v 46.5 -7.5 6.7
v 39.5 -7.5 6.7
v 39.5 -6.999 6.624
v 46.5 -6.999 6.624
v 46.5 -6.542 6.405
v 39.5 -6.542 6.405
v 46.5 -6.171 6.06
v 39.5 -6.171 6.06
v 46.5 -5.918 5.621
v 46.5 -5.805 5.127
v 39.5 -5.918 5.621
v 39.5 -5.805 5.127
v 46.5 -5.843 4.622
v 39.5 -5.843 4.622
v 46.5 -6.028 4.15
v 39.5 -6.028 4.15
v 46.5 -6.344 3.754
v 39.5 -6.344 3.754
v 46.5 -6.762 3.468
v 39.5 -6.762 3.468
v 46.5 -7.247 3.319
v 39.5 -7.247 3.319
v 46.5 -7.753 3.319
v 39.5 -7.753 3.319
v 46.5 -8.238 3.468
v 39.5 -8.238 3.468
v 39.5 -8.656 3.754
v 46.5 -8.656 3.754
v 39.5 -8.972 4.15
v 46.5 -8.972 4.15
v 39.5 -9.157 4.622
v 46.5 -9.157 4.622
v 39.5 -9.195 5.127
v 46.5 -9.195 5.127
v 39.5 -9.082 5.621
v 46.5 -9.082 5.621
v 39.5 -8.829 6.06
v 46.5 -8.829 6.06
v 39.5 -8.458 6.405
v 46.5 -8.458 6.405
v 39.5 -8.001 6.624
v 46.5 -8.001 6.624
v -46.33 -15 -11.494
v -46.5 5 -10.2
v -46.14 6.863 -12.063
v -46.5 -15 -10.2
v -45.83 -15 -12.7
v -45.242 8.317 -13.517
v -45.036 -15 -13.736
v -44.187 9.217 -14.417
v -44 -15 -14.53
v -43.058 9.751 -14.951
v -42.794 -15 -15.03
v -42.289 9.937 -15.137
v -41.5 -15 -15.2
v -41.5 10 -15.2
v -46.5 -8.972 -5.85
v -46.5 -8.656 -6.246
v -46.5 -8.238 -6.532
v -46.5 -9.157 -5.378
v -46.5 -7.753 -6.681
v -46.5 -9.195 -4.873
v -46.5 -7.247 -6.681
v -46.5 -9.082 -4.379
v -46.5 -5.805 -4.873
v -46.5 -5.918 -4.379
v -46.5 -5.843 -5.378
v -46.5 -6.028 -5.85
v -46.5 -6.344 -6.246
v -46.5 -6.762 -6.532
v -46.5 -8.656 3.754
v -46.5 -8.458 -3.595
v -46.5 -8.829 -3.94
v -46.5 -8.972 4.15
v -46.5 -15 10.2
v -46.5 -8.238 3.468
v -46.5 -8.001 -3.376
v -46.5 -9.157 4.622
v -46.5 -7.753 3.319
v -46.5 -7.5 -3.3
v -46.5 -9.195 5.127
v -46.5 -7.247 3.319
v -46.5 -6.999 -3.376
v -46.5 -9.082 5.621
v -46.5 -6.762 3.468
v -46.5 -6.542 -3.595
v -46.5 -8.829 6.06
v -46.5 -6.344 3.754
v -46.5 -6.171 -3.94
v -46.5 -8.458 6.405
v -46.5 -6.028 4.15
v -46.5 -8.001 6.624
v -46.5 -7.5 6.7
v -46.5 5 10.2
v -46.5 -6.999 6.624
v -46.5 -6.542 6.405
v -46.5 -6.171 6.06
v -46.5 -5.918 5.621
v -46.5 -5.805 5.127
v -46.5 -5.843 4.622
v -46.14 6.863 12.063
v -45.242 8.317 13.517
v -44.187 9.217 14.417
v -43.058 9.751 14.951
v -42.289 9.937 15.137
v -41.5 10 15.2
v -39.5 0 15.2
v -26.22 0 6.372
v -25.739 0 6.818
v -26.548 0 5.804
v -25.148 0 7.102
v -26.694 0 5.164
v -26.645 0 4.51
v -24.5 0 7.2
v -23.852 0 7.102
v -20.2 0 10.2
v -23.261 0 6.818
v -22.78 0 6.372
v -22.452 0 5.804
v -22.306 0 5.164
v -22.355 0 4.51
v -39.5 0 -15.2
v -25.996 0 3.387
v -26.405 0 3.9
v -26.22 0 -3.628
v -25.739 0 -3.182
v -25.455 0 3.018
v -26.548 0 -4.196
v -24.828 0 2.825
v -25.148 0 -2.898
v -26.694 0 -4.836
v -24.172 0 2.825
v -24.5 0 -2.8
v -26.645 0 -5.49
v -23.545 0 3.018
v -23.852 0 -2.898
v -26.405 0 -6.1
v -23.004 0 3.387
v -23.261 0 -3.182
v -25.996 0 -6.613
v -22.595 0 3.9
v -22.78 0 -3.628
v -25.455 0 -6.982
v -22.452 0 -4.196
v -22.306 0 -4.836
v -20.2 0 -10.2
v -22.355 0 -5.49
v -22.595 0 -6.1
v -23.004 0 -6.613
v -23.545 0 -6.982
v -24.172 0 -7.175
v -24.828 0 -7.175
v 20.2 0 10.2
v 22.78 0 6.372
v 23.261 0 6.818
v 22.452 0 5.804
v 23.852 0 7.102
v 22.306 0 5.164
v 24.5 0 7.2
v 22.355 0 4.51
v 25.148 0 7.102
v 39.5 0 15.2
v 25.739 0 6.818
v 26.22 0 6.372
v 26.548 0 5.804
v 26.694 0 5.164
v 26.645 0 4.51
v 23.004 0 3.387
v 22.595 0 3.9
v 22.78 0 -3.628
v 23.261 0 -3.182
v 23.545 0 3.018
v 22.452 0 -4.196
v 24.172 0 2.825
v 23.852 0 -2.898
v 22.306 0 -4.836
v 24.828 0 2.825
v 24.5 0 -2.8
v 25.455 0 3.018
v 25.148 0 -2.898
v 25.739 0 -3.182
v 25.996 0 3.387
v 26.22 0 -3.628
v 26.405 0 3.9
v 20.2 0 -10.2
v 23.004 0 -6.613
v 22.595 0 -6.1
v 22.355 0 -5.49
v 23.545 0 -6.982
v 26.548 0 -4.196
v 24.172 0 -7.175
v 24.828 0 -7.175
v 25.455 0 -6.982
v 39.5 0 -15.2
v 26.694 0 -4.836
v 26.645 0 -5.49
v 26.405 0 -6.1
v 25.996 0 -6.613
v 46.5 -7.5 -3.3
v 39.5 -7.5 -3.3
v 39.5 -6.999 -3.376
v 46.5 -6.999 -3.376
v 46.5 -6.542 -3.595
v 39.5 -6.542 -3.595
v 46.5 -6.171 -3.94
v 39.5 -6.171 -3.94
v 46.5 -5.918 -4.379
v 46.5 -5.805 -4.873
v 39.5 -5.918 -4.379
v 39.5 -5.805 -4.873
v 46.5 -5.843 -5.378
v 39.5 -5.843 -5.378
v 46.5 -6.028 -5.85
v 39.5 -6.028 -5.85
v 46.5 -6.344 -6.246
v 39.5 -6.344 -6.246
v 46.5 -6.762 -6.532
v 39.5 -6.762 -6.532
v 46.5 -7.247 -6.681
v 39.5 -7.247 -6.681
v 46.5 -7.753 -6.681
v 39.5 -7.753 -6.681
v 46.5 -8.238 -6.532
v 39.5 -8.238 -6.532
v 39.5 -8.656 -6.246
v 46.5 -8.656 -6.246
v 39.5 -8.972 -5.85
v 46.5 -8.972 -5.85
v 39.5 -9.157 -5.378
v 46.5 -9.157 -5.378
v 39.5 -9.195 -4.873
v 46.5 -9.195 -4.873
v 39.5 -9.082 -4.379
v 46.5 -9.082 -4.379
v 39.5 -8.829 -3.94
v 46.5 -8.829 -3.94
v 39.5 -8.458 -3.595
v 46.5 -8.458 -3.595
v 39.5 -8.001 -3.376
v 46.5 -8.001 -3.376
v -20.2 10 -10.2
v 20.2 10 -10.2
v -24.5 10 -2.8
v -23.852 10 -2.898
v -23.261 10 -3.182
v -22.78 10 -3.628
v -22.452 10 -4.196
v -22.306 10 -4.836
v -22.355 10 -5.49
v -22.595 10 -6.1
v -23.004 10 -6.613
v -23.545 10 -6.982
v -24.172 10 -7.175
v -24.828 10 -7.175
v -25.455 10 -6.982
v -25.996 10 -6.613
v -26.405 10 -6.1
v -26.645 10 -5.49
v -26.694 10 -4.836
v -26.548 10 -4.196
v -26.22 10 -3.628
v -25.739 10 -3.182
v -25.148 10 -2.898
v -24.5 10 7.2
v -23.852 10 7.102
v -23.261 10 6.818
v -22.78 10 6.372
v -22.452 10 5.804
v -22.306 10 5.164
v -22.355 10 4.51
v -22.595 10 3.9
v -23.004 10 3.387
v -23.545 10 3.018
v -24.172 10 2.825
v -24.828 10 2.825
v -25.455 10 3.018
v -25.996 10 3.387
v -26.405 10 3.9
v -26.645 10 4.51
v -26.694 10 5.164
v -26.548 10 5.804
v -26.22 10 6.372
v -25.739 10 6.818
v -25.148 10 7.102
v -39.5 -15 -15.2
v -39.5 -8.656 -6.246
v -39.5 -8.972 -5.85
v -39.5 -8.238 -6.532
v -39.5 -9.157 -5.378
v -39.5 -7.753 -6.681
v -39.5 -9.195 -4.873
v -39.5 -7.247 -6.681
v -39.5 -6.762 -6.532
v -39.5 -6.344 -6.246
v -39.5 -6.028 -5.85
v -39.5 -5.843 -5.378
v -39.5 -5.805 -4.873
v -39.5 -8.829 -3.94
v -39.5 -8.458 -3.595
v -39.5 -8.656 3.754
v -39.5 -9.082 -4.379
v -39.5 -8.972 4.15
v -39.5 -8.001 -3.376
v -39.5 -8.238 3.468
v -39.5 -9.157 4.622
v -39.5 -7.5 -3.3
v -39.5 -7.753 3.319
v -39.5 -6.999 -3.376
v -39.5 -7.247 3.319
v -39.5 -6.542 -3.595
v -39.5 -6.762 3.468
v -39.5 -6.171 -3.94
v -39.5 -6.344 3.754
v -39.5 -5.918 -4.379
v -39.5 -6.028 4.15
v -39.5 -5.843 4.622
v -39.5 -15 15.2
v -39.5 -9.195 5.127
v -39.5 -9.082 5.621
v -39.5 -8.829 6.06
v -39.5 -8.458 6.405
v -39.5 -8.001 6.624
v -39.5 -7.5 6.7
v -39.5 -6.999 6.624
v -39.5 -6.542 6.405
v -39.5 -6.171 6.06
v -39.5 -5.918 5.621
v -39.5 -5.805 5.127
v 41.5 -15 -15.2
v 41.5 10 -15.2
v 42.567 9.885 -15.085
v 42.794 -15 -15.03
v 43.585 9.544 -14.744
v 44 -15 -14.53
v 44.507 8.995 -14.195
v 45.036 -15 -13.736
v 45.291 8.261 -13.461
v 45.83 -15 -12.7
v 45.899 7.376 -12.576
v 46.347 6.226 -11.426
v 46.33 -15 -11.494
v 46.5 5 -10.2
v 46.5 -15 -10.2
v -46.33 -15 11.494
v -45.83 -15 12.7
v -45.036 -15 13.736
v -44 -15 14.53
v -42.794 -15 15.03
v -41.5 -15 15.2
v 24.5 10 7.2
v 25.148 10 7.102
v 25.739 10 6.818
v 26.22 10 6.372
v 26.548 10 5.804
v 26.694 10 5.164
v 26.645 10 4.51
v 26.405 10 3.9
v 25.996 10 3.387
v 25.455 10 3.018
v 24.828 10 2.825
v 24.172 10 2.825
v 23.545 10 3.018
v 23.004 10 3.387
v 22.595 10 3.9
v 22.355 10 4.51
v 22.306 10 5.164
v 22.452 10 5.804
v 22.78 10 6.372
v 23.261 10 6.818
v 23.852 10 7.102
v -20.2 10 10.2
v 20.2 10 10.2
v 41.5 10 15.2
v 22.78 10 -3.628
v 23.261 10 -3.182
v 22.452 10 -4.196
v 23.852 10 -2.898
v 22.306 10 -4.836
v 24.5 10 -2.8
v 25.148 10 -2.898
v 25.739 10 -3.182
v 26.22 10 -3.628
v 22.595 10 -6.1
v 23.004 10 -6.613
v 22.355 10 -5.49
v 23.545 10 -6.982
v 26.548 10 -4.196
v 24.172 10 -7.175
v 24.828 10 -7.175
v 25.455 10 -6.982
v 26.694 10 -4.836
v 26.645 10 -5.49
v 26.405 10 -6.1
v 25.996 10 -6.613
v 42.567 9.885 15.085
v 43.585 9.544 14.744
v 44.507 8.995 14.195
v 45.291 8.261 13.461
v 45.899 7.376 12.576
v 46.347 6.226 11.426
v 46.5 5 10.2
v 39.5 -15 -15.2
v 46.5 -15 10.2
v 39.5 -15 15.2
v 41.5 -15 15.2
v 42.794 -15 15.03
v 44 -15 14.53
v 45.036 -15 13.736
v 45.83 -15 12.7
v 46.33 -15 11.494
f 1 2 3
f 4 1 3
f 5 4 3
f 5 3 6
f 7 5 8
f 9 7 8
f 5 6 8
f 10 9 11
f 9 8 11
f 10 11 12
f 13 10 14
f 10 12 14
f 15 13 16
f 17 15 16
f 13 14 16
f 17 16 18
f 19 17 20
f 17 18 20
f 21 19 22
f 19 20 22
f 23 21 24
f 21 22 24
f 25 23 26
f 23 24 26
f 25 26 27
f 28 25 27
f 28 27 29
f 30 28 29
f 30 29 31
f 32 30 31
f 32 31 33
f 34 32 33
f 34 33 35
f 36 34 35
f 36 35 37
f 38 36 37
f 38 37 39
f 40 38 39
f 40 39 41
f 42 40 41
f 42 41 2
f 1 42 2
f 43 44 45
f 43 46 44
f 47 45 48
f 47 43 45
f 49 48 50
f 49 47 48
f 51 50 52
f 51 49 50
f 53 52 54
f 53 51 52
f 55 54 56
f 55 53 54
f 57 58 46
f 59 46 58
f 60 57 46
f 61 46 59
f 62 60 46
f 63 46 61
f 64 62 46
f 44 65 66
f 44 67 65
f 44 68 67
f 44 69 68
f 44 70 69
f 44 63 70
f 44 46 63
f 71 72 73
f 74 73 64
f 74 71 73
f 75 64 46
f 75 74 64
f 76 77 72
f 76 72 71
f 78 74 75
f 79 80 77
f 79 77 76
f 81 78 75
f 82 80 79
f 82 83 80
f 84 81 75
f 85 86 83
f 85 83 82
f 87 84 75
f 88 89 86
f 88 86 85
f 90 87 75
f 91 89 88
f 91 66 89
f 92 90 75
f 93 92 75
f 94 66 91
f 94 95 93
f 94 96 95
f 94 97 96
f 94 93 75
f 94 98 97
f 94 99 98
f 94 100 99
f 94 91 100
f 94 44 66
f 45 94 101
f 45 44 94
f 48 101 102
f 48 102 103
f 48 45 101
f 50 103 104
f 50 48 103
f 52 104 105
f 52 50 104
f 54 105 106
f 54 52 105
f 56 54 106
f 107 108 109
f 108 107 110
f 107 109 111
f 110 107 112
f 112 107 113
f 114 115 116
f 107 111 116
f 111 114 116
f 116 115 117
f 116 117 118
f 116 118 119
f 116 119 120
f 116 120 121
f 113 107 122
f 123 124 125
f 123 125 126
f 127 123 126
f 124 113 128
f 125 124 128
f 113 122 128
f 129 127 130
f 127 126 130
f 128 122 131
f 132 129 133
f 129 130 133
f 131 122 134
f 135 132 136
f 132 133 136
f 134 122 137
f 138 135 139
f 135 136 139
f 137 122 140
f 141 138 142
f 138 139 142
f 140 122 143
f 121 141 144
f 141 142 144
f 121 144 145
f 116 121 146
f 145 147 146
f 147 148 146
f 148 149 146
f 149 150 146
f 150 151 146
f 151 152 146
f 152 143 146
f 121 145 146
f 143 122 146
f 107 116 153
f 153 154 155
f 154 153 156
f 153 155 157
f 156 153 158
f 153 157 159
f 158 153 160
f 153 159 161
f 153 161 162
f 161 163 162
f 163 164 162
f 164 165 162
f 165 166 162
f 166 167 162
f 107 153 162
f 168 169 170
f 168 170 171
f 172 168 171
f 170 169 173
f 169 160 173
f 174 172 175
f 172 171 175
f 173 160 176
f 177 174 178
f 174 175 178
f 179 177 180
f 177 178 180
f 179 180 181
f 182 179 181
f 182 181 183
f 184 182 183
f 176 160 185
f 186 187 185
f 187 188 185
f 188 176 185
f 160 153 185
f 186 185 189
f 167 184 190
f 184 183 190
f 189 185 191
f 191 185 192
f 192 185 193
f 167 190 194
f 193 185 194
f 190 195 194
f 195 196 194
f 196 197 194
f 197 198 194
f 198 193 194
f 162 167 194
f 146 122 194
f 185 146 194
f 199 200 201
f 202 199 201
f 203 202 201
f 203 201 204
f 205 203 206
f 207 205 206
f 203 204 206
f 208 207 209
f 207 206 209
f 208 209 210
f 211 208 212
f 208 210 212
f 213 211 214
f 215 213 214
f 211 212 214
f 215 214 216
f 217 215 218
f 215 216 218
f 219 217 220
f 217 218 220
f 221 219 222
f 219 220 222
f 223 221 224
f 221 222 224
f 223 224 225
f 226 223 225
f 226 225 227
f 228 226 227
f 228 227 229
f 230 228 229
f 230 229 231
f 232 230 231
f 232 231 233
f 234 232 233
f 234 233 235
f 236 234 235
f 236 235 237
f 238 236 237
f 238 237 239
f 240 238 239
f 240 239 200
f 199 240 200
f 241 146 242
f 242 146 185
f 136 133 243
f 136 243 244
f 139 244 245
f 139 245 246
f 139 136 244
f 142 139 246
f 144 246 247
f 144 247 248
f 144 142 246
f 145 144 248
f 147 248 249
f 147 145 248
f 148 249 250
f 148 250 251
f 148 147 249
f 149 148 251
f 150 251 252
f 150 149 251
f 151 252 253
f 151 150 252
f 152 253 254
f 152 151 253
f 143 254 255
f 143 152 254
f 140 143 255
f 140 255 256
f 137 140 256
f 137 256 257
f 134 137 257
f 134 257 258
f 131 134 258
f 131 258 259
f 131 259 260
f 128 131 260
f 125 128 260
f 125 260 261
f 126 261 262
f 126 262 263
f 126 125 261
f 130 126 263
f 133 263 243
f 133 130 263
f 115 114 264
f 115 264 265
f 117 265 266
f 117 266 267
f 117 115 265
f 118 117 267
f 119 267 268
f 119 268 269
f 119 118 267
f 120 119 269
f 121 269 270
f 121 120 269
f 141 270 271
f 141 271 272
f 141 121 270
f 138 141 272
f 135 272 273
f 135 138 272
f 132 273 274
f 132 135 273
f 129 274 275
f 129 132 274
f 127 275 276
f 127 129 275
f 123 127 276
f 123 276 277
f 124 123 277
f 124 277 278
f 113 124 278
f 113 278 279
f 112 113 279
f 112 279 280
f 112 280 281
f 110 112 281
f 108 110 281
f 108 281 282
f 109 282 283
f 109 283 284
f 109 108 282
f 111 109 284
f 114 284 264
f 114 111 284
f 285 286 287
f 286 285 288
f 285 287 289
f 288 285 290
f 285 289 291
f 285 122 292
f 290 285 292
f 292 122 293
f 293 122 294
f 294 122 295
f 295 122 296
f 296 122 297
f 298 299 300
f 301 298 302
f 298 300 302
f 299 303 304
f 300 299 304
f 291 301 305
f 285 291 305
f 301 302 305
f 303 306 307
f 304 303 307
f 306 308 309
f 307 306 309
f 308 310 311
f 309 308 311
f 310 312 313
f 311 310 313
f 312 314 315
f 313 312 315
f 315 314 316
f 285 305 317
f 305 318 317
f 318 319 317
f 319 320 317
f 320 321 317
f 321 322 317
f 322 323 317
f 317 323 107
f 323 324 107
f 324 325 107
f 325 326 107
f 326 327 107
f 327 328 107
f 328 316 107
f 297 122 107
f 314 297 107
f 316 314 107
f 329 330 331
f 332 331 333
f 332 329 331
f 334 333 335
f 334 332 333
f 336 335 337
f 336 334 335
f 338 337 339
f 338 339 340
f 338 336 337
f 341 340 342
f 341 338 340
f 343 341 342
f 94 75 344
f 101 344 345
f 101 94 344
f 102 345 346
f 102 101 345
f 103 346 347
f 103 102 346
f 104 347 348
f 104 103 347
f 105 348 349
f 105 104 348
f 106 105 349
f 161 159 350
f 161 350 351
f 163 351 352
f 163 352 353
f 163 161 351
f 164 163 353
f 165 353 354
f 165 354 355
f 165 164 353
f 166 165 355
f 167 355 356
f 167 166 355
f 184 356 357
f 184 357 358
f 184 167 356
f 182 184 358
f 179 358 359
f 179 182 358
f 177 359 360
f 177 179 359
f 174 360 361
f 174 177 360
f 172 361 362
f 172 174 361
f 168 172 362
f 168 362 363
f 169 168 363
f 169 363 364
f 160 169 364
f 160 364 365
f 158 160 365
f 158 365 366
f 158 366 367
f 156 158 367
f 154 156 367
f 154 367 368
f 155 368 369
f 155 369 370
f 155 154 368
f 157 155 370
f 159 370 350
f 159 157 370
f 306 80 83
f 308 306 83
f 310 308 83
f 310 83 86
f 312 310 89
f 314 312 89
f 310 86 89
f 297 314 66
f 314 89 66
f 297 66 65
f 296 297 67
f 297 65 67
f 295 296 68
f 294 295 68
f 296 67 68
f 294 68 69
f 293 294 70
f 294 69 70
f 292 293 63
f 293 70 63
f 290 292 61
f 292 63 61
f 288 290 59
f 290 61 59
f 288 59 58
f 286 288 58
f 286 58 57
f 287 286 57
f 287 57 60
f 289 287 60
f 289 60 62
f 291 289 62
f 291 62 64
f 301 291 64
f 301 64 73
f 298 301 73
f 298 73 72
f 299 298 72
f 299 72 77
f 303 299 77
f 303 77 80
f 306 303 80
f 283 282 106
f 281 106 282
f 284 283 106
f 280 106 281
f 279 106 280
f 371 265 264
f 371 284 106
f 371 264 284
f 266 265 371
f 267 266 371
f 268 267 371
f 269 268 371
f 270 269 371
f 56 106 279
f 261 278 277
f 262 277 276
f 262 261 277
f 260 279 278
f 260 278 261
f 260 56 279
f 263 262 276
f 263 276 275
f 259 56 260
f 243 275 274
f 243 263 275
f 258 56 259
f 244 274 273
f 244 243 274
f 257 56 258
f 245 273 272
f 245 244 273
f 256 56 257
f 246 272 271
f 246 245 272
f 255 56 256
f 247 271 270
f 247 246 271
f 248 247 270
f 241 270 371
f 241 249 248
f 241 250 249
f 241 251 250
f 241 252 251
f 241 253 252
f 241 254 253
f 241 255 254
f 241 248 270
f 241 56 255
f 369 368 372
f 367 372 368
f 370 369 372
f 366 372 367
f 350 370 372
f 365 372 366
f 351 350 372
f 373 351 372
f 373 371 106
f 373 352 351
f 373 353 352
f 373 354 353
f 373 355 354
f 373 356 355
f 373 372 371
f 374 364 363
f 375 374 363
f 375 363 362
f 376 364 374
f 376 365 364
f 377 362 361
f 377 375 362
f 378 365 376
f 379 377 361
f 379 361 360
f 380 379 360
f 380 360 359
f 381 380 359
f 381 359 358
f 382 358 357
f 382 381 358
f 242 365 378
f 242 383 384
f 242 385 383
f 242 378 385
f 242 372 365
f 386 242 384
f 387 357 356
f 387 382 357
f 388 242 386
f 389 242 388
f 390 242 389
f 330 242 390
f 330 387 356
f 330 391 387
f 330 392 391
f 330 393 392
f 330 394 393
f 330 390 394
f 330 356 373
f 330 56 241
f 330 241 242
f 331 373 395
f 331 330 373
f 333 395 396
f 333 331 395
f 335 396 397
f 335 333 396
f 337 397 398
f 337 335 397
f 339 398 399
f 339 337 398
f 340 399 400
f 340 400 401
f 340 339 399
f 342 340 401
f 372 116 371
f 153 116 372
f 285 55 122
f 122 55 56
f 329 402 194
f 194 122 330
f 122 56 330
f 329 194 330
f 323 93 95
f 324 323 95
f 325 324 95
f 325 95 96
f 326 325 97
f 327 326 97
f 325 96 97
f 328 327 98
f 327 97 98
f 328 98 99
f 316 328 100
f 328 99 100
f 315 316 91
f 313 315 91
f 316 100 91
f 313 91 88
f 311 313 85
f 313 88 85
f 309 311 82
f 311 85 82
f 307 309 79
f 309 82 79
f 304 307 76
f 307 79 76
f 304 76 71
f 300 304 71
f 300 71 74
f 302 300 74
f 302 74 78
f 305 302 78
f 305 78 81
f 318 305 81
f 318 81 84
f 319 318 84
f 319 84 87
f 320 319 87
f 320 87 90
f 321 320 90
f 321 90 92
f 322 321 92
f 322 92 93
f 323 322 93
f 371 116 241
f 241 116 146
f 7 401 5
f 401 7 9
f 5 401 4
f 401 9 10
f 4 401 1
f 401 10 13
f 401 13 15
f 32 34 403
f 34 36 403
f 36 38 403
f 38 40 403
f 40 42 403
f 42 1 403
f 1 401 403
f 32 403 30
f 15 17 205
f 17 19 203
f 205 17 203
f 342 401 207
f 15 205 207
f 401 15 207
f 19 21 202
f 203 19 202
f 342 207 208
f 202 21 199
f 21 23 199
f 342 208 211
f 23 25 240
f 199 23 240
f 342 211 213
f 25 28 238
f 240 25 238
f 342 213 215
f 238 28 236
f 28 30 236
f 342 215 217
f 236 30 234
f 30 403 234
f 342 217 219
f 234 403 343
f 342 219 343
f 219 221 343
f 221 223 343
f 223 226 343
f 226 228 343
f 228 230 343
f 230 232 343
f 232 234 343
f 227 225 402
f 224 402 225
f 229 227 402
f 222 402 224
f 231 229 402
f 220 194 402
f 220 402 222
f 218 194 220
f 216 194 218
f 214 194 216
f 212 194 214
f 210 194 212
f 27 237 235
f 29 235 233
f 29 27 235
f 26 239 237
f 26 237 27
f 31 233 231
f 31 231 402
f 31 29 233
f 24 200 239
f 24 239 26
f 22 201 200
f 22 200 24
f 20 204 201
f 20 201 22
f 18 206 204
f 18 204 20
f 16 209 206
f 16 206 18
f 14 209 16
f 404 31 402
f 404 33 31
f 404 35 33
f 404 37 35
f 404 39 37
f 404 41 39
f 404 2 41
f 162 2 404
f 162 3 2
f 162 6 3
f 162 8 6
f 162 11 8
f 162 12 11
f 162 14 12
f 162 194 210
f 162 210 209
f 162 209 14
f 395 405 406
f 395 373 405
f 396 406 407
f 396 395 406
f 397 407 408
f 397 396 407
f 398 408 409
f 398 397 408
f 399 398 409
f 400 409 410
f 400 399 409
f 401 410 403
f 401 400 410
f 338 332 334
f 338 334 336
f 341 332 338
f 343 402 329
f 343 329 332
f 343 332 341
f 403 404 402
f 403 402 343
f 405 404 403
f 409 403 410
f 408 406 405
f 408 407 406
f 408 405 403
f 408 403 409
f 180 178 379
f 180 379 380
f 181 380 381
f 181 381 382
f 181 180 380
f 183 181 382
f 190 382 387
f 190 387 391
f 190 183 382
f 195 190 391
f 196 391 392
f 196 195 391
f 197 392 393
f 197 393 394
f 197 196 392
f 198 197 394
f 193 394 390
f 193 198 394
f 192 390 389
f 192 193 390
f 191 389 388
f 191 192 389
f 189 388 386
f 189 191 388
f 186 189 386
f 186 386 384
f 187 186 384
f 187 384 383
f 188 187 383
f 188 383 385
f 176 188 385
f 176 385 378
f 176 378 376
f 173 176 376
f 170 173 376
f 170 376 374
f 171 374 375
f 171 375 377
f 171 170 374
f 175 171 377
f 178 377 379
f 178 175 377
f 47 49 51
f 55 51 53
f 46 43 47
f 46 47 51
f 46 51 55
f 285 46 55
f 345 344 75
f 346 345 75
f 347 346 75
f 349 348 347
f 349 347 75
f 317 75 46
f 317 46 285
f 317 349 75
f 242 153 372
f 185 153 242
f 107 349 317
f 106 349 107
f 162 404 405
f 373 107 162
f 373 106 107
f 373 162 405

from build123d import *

# Parameters (mm, degrees)
SKETCH_1_W          = 93
SKETCH_1_H          = 30.4
SKETCH_1_R          = 2.2
SKETCH_1_W_2        = 40.4
SKETCH_1_H_2        = 20.4
EXTRUDE_1_DEPTH     = 10
SKETCH_2_W          = 7
SKETCH_2_H          = 30.4
EXTRUDE_2_DEPTH     = 15
SKETCH_4_R          = 1.7
CUT_EXTRUDE_2_DEPTH = 96.420333263
FILLET_1_R          = 5


with BuildPart() as part:
    # 草图1 → 凸台-拉伸1 (new body)
    with BuildSketch(Plane(origin=(0, 0, 0), x_dir=(1, 0, 0), z_dir=(0, 1, 0))):
        Rectangle(SKETCH_1_W, SKETCH_1_H)
        with Locations(Location((-24.5, 5, 0), (0, 0, 270))):
            Circle(SKETCH_1_R, mode=Mode.SUBTRACT)
        with Locations(Location((-24.5, -5, 0), (0, 0, 270))):
            Circle(SKETCH_1_R, mode=Mode.SUBTRACT)
        with Locations(Location((24.5, -5, 0), (0, 0, 270))):
            Circle(SKETCH_1_R, mode=Mode.SUBTRACT)
        with Locations(Location((24.5, 5, 0), (0, 0, 270))):
            Circle(SKETCH_1_R, mode=Mode.SUBTRACT)
        Rectangle(SKETCH_1_W_2, SKETCH_1_H_2, mode=Mode.SUBTRACT)
    extrude(amount=EXTRUDE_1_DEPTH)

    # 草图2 → 凸台-拉伸2 (add)
    with BuildSketch(Plane.XZ):
        with Locations((-43, 0)):
            Rectangle(SKETCH_2_W, SKETCH_2_H)
        with Locations((43, 0)):
            Rectangle(SKETCH_2_W, SKETCH_2_H)
    extrude(amount=EXTRUDE_2_DEPTH)

    # 草图4 → 切除-拉伸2 (cut, through all)
    with BuildSketch(Plane.ZY.offset(46.5)):
        with Locations((-5, -7.5)):
            Circle(SKETCH_4_R)
        with Locations((5, -7.5)):
            Circle(SKETCH_4_R)
    extrude(amount=-CUT_EXTRUDE_2_DEPTH, mode=Mode.SUBTRACT)

    # 圆角1
    fillet_1_edges = [part.edges().sort_by_distance(p)[0] for p in [
        (46.5, 10, 0),
        (-46.5, 10, 0),
        (-46.5, -2.5, -15.2),
        (46.5, -2.5, -15.2),
        (46.5, -2.5, 15.2),
        (-46.5, -2.5, 15.2),
    ]]
    fillet(fillet_1_edges, radius=FILLET_1_R)


solid = part.part
